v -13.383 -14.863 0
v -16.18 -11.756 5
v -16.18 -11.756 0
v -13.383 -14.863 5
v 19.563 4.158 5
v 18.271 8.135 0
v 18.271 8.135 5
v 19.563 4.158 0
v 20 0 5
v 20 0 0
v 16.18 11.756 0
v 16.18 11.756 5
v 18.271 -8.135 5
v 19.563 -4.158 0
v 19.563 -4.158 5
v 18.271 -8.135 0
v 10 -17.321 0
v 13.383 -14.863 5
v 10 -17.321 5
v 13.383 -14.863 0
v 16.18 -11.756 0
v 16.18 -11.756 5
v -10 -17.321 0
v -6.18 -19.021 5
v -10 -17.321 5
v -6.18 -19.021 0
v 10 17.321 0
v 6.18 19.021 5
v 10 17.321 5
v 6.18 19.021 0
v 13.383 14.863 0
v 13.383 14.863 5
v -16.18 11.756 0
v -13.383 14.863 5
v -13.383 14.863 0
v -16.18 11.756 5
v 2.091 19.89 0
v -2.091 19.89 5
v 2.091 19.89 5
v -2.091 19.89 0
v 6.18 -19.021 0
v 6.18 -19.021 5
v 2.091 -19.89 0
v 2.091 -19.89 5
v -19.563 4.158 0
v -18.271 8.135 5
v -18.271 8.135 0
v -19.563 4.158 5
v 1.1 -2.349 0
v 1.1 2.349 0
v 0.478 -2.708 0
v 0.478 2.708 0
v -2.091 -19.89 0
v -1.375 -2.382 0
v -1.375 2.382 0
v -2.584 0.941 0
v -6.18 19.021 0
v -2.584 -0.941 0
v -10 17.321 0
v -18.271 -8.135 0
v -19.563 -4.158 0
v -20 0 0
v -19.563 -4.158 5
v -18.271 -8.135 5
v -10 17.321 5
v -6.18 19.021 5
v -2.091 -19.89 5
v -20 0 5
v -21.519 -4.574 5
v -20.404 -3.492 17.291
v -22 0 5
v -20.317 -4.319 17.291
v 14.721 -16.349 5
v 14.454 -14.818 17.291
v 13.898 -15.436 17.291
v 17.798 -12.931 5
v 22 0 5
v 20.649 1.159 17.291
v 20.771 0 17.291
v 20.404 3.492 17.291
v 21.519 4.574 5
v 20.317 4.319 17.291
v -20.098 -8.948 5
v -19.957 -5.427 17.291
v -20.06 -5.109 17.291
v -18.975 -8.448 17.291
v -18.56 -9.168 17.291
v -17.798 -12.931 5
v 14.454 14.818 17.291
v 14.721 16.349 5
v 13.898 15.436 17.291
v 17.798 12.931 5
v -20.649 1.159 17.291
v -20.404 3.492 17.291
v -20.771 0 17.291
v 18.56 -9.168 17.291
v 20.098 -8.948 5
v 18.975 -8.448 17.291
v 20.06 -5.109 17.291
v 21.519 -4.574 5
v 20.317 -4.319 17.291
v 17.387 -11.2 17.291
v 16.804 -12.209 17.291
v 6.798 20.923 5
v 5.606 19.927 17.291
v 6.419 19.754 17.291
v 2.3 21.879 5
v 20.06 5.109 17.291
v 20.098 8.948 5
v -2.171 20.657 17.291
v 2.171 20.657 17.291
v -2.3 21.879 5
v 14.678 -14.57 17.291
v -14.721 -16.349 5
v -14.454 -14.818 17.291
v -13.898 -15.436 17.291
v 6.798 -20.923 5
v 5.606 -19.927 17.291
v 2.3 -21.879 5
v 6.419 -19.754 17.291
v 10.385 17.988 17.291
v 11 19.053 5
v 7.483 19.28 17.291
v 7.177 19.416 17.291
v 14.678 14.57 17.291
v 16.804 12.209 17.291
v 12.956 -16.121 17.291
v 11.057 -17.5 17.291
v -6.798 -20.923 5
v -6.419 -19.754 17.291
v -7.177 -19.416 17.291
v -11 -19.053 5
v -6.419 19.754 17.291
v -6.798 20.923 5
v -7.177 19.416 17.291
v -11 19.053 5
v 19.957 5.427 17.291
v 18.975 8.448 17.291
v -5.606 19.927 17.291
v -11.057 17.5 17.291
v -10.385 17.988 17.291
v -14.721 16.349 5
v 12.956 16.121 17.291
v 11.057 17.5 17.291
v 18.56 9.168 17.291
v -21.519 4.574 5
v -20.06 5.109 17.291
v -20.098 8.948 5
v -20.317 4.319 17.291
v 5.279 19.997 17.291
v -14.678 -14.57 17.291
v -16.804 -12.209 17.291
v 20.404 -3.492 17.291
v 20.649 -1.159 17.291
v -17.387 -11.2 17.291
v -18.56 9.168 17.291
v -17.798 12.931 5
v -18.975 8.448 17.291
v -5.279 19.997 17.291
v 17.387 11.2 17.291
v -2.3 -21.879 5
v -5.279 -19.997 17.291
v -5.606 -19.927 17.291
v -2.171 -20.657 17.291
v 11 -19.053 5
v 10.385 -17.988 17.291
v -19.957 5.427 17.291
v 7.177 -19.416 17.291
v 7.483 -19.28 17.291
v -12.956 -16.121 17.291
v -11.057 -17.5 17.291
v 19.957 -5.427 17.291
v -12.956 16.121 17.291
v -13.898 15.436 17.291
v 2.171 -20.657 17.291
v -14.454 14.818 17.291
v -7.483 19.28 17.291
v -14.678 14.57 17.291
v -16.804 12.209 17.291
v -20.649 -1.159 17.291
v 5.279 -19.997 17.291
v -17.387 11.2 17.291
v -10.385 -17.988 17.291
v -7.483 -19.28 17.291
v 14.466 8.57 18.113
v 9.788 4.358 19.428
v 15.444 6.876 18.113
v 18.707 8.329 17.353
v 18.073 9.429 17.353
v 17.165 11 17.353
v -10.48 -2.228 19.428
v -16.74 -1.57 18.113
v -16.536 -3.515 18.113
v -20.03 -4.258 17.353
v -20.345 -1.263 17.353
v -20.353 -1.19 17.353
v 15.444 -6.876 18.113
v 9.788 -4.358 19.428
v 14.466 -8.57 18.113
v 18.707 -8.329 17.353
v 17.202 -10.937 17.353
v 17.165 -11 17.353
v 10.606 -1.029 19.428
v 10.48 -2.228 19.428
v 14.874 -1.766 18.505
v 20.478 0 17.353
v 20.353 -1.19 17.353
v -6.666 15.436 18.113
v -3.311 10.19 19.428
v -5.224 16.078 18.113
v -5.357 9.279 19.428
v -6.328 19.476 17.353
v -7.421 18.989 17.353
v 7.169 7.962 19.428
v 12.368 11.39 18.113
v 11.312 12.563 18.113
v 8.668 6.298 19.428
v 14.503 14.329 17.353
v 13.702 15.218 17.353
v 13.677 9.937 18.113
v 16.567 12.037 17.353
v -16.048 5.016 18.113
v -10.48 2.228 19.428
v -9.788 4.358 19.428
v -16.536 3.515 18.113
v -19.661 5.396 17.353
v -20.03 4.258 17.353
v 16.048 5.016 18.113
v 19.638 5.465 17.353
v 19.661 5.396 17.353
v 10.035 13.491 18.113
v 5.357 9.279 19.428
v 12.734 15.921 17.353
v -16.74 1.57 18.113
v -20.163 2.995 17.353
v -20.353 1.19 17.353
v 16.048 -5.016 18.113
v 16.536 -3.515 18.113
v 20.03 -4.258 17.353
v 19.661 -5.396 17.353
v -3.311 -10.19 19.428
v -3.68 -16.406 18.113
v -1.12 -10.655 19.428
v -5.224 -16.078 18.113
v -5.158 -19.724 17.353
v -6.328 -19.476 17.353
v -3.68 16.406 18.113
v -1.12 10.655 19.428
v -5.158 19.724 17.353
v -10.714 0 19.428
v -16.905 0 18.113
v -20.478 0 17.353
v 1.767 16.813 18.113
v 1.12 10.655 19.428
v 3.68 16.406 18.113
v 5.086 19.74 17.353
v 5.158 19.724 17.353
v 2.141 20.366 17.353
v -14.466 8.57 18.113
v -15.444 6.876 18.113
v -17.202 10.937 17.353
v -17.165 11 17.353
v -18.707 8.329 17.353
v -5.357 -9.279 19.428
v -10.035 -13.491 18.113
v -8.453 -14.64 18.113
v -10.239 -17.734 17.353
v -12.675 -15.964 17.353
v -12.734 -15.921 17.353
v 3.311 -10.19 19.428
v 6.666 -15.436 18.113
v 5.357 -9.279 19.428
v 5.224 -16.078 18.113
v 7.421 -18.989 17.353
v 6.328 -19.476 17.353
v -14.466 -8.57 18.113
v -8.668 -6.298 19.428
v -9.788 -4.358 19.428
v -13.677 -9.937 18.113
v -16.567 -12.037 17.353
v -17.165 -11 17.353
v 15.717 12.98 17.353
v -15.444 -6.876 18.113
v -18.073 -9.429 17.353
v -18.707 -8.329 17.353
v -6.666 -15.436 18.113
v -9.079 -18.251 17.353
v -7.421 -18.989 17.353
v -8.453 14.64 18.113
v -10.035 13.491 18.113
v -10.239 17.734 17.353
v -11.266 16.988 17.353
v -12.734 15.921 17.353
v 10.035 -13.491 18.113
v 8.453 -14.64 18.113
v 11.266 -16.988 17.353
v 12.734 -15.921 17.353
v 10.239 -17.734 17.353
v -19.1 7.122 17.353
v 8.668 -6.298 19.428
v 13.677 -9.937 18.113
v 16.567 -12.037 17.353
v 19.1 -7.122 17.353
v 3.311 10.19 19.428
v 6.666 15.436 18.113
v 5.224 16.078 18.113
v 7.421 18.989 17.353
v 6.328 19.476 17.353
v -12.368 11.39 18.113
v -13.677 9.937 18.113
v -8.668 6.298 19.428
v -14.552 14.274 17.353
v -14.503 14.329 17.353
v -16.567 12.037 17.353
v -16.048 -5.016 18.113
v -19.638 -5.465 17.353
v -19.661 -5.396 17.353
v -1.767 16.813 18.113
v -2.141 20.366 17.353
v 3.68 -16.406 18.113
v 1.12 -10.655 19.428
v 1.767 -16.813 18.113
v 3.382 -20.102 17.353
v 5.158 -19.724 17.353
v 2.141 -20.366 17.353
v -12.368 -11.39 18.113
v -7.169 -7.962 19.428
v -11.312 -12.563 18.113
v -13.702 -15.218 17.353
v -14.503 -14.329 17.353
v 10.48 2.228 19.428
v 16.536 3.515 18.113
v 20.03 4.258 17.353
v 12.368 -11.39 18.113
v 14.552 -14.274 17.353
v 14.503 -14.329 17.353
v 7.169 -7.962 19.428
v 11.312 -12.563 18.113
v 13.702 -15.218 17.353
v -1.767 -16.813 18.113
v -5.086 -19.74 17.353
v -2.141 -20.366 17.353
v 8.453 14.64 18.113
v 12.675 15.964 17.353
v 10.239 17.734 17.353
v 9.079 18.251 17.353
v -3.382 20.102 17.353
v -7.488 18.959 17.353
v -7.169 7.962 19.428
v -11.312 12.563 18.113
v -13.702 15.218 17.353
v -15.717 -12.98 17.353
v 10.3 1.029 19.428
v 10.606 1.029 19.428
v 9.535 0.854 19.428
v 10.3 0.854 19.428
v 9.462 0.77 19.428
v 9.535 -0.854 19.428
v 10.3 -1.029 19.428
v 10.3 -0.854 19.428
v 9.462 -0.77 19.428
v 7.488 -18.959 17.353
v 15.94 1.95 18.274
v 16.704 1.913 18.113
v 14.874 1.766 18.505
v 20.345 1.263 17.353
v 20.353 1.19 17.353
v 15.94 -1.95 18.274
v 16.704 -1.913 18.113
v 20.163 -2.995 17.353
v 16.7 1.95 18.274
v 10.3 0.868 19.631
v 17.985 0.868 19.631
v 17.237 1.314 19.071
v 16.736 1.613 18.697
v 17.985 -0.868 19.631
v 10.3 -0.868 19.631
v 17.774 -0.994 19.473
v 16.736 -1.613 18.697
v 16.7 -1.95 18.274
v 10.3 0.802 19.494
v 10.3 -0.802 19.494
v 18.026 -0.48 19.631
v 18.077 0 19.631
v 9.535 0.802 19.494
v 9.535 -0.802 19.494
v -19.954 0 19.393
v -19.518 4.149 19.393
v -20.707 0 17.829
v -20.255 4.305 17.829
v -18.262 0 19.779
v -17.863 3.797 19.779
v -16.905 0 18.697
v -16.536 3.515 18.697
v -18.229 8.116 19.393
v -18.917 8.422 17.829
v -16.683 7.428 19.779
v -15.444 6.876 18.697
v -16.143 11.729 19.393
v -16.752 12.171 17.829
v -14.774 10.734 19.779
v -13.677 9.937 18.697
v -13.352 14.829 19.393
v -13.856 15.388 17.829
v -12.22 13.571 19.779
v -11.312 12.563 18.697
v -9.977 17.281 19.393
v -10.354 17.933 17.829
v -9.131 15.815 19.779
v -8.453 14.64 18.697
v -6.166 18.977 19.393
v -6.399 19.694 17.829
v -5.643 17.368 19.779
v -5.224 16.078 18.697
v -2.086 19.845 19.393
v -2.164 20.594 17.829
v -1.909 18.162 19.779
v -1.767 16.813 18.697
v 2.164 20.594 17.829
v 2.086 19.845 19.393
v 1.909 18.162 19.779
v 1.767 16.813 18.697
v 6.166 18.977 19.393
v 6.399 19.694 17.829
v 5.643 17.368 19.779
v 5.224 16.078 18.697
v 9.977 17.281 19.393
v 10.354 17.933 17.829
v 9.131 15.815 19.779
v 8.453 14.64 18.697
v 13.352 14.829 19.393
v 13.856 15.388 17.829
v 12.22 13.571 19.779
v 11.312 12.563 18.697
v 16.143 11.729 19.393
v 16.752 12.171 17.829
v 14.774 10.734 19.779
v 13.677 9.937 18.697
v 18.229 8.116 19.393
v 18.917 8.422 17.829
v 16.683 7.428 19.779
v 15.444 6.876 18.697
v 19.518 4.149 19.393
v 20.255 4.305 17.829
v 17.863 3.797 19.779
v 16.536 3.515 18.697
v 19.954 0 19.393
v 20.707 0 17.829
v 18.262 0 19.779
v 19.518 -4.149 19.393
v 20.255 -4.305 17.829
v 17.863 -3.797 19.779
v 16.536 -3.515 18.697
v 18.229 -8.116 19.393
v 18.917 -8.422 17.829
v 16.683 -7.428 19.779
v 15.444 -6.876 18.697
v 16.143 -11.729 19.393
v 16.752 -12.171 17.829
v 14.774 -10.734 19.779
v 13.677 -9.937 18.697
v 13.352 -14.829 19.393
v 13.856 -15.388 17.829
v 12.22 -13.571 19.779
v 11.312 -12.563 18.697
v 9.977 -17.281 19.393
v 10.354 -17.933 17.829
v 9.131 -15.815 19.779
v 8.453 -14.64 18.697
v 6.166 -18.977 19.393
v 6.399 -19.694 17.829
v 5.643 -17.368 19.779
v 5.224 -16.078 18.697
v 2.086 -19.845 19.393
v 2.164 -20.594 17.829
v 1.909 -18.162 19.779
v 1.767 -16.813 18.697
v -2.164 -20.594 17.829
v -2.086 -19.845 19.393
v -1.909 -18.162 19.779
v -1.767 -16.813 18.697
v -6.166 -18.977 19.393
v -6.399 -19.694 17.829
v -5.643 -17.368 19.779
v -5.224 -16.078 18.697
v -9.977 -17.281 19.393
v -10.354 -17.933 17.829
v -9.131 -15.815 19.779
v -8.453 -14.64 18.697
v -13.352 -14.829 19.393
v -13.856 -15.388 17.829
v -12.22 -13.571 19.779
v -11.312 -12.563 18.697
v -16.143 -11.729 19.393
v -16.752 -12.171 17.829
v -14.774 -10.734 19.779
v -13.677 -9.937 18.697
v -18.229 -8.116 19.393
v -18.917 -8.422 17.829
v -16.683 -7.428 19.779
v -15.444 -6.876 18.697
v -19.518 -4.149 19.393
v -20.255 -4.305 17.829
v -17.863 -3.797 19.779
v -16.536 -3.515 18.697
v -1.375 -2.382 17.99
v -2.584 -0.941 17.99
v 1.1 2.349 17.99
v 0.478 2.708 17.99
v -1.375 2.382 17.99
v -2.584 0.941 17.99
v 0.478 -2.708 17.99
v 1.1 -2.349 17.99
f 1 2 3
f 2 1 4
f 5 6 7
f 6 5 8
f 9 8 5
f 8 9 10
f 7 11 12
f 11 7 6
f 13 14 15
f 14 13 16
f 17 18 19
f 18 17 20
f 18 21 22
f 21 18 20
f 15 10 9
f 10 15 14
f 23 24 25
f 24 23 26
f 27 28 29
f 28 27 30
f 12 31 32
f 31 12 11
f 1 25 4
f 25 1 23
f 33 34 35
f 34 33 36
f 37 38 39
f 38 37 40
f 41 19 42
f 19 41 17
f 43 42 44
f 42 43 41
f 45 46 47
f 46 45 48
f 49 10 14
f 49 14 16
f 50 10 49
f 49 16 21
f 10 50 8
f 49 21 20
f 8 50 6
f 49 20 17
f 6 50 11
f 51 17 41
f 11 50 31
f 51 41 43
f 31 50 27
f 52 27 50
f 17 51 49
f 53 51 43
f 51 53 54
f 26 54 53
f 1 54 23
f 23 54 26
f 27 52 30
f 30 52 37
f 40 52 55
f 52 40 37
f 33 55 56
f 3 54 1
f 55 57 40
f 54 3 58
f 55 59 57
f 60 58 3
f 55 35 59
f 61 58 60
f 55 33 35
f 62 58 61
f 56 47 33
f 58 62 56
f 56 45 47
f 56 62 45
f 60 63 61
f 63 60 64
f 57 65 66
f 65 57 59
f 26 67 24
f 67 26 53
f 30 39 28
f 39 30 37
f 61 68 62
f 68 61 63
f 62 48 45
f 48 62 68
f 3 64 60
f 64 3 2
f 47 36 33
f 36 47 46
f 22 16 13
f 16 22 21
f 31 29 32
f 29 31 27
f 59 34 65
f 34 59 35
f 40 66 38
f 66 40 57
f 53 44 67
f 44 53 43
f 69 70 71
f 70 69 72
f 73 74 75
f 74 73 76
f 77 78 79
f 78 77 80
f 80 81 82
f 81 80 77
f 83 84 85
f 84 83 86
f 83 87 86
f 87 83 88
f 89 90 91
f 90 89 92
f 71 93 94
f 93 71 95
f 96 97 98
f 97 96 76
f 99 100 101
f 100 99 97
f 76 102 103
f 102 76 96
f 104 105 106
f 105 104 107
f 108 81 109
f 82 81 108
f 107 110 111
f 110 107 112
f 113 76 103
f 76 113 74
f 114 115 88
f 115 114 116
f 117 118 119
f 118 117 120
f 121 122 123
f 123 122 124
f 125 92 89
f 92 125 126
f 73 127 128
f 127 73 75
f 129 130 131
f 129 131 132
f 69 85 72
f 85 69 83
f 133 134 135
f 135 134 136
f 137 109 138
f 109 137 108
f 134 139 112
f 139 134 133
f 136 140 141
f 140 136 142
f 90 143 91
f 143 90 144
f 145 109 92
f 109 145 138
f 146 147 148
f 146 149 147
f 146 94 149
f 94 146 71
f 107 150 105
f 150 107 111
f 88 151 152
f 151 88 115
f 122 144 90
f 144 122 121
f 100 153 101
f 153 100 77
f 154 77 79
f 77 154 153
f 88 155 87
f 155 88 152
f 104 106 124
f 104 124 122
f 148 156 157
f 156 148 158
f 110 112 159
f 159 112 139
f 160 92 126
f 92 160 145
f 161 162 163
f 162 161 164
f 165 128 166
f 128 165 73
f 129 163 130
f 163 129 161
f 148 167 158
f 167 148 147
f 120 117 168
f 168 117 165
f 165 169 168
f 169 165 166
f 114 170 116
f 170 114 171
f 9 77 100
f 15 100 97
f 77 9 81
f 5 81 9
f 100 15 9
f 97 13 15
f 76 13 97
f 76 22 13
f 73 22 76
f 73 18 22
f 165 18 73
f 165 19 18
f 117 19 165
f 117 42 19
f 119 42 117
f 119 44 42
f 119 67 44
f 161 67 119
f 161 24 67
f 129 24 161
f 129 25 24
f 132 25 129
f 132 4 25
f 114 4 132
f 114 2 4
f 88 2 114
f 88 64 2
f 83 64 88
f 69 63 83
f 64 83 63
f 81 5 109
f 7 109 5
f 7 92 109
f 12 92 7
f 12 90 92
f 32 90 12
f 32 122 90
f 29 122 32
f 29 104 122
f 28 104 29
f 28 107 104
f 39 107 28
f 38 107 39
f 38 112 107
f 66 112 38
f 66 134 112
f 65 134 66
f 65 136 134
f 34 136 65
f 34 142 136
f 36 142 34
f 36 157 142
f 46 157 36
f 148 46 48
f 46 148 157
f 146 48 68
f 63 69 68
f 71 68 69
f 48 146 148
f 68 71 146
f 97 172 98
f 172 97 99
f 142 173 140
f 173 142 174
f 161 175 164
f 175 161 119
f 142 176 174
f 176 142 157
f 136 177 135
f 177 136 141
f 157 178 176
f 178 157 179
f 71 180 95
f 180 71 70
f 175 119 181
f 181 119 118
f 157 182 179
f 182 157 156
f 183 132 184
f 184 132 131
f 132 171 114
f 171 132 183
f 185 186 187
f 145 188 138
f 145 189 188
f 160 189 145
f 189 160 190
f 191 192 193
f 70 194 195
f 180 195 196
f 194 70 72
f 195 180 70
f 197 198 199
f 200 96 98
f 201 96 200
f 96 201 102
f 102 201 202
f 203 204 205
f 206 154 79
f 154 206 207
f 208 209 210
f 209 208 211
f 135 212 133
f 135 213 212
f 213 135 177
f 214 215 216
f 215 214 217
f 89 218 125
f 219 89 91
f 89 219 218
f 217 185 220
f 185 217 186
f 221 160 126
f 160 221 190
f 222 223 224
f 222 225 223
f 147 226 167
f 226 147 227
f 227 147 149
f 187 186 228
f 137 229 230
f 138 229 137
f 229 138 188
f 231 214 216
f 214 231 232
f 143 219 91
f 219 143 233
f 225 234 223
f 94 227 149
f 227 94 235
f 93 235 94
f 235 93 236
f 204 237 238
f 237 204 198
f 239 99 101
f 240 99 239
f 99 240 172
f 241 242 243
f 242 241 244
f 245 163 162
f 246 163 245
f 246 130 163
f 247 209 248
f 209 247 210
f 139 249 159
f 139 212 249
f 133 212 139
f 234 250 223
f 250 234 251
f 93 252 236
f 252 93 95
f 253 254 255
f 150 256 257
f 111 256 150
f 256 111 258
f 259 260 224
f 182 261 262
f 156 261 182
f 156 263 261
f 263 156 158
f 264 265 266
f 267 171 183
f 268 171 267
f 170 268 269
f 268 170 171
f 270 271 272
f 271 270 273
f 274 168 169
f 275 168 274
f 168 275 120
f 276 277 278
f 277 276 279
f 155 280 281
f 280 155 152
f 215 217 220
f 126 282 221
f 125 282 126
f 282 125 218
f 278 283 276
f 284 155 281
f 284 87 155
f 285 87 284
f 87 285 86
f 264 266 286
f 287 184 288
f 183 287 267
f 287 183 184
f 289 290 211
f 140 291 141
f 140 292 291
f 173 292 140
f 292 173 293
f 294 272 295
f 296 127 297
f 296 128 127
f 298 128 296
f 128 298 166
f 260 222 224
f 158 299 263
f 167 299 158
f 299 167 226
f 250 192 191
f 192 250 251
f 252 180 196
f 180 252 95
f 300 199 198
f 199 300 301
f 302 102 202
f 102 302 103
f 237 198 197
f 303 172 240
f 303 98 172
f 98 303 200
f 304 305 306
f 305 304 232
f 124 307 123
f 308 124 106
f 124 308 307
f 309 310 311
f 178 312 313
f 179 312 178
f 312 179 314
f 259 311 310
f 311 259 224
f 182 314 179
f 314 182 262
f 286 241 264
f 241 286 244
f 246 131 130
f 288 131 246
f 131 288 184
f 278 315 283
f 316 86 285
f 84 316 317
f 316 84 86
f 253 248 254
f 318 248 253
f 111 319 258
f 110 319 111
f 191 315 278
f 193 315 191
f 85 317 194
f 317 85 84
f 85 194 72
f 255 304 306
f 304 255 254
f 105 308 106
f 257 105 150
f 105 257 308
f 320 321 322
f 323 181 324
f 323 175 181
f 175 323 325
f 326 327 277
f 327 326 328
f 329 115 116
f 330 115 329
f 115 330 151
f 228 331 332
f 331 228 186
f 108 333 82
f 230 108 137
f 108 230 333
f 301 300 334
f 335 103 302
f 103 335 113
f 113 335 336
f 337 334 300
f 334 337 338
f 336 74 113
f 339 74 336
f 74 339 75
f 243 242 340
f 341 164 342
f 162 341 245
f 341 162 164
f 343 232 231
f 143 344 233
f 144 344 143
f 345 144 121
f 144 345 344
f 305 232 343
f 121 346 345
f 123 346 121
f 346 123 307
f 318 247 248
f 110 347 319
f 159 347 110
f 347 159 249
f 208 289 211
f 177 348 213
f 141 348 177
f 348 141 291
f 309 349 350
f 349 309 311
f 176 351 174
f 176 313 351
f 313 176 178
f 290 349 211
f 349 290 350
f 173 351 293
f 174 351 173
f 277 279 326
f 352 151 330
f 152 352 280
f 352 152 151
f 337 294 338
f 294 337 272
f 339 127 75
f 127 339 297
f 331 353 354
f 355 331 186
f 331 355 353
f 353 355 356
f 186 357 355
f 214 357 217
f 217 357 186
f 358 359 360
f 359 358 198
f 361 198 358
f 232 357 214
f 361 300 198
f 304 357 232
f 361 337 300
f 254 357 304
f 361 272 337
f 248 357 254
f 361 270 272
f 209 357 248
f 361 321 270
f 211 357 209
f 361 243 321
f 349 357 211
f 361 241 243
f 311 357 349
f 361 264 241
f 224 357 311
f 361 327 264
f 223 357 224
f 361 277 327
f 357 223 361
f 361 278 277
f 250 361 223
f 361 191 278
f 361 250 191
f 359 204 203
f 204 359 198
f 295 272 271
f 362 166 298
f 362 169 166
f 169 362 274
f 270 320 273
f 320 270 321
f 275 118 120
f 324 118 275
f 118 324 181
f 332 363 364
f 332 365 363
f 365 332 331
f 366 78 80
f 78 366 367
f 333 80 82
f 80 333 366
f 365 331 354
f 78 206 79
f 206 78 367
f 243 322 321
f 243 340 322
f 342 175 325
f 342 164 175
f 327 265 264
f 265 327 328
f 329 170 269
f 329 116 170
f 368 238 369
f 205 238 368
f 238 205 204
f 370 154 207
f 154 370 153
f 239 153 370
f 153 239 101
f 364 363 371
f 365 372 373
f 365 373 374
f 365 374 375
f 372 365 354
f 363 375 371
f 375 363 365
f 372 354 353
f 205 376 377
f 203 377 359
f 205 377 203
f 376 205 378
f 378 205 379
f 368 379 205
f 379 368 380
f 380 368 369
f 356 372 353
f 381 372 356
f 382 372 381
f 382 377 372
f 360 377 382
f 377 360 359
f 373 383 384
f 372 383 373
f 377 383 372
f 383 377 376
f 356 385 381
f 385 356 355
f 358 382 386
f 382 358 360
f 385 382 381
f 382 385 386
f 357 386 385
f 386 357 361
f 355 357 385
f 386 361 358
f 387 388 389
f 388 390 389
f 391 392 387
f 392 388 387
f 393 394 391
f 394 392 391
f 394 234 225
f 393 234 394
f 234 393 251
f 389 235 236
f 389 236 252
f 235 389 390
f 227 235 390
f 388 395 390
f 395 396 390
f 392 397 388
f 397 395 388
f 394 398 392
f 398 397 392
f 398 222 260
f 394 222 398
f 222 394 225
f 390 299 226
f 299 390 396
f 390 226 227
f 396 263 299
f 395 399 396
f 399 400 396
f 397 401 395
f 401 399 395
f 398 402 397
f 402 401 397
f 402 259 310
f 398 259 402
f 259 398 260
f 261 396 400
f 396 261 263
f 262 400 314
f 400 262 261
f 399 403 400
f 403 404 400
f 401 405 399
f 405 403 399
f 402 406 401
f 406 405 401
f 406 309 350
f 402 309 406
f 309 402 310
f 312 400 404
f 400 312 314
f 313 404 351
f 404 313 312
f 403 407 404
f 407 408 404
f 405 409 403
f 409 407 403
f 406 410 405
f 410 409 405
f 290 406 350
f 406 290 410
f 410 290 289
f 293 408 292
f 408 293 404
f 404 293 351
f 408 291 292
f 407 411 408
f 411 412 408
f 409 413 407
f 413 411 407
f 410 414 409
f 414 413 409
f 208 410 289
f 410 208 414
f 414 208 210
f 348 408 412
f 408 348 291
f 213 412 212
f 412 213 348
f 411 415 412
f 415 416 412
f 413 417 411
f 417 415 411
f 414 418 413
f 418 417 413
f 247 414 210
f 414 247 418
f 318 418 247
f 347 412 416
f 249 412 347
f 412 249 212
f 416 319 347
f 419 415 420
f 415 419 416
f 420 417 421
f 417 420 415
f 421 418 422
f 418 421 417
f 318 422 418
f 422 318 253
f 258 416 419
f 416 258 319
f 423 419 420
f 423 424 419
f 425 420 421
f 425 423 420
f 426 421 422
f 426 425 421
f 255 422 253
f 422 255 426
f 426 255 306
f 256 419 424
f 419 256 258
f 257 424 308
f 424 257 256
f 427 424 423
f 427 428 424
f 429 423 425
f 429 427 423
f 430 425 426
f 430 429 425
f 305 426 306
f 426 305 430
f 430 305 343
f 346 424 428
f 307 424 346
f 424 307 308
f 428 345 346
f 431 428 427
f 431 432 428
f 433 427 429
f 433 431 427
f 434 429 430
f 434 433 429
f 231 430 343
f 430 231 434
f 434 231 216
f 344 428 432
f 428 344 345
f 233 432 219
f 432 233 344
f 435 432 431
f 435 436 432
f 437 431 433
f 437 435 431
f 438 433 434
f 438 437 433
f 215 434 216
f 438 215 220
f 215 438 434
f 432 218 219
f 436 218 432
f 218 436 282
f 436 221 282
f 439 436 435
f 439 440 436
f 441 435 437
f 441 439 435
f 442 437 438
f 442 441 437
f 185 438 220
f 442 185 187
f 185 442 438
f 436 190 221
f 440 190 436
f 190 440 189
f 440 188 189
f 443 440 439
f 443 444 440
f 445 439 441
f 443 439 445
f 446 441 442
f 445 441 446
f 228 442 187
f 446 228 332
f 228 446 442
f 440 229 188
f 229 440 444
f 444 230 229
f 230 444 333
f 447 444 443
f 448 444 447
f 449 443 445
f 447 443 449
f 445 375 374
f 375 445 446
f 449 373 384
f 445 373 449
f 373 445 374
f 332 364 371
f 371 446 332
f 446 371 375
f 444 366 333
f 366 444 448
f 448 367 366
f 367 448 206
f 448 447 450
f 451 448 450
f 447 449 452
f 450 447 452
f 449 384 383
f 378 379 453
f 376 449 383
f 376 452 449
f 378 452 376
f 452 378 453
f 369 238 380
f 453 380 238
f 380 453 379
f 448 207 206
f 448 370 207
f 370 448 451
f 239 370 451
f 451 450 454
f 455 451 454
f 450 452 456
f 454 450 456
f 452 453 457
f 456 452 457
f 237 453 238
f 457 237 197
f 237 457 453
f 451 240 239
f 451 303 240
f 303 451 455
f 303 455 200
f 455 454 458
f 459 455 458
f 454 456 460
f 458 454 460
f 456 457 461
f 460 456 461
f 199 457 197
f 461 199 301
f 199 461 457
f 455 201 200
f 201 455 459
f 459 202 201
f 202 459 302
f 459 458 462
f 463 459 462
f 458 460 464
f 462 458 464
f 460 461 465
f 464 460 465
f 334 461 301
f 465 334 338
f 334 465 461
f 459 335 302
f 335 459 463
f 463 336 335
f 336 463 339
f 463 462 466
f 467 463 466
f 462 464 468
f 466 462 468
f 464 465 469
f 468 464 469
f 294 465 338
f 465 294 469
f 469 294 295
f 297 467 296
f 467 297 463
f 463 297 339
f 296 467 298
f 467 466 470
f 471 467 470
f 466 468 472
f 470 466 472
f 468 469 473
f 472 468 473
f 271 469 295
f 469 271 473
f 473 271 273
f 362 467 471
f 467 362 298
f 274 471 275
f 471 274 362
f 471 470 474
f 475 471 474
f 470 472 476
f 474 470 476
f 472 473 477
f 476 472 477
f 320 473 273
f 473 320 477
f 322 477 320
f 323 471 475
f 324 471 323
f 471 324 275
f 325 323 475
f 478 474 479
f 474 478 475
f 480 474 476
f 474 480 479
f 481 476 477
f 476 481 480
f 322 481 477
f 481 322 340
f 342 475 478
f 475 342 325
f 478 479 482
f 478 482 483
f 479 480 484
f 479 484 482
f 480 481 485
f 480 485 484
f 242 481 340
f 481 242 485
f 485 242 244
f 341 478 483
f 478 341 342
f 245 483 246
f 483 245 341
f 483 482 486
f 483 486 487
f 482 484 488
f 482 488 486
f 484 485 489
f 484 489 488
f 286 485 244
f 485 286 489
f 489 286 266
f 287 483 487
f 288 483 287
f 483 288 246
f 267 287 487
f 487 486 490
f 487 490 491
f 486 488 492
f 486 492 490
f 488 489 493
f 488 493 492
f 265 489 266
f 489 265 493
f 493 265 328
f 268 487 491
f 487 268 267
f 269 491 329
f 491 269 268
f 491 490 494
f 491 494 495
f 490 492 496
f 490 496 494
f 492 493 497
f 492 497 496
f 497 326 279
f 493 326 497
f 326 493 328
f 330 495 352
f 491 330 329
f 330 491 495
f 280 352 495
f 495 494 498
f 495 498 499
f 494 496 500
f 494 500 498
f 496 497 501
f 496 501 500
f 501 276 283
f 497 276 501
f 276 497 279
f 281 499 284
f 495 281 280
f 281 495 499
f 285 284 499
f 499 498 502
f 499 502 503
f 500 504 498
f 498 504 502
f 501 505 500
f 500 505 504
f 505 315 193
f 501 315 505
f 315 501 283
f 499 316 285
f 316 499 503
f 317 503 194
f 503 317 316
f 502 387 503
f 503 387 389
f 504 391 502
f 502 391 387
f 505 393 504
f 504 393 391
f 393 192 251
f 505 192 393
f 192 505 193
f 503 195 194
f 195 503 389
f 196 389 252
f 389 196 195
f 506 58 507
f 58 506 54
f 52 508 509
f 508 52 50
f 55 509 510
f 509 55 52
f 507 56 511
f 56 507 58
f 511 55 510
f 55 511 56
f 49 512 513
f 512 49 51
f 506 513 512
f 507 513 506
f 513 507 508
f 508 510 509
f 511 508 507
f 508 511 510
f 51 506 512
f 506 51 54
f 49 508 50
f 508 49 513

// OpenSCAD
//$fn = 120;

base_r = 40/2;
base_offs_r = 2;
base_h = 5;

main_r = 41/2;
main_h = 15;

axle_r = 5.5/2;
axle_h = base_h+main_h-2;
axle_key_offs = 0.6;

sphere_r = 5*main_r;
torus_r = 2;

mark_len = 0.4*main_r;

eps = 1e-2;

main_knob();

module main_knob() {
    difference() {
        union() {
            intersection() {
                union() {
                    cylinder(r=base_r, h=base_h+eps);
                    translate([0, 0, base_h])
                        cylinder(r1=base_r+base_offs_r, r2=main_r, h=main_h);
                }
                translate([0, 0, -sphere_r+base_h+main_h-eps]) sphere(r=sphere_r);
            }
            let (dh=sphere_r-sqrt(sphere_r*sphere_r-main_r*main_r)) {
                translate([0, 0, base_h+main_h-dh-0.1]) 
                    torus(Rad=main_r-torus_r+(base_r+base_offs_r-main_r)*dh/main_h, rad=torus_r);
                translate([main_r-torus_r-mark_len, 0, base_h+main_h-dh-0.1])
                    rotate([0, 90, 0]) {
                        cylinder(r=torus_r, h=mark_len);
                        sphere(r=torus_r);
                    }
            }
        }
        translate([0, 0, -eps]) axle();
    }
}

module axle() {
    difference() {
        cylinder(r=axle_r, h=axle_h);
        translate([2*axle_h+(1-axle_key_offs)*axle_r, 0, 0]) cube(4*axle_h, center=true);
    }
}

module torus (Rad, rad) {
    rotate_extrude() {
        translate([Rad, 0]) circle(rad);
    }
}
